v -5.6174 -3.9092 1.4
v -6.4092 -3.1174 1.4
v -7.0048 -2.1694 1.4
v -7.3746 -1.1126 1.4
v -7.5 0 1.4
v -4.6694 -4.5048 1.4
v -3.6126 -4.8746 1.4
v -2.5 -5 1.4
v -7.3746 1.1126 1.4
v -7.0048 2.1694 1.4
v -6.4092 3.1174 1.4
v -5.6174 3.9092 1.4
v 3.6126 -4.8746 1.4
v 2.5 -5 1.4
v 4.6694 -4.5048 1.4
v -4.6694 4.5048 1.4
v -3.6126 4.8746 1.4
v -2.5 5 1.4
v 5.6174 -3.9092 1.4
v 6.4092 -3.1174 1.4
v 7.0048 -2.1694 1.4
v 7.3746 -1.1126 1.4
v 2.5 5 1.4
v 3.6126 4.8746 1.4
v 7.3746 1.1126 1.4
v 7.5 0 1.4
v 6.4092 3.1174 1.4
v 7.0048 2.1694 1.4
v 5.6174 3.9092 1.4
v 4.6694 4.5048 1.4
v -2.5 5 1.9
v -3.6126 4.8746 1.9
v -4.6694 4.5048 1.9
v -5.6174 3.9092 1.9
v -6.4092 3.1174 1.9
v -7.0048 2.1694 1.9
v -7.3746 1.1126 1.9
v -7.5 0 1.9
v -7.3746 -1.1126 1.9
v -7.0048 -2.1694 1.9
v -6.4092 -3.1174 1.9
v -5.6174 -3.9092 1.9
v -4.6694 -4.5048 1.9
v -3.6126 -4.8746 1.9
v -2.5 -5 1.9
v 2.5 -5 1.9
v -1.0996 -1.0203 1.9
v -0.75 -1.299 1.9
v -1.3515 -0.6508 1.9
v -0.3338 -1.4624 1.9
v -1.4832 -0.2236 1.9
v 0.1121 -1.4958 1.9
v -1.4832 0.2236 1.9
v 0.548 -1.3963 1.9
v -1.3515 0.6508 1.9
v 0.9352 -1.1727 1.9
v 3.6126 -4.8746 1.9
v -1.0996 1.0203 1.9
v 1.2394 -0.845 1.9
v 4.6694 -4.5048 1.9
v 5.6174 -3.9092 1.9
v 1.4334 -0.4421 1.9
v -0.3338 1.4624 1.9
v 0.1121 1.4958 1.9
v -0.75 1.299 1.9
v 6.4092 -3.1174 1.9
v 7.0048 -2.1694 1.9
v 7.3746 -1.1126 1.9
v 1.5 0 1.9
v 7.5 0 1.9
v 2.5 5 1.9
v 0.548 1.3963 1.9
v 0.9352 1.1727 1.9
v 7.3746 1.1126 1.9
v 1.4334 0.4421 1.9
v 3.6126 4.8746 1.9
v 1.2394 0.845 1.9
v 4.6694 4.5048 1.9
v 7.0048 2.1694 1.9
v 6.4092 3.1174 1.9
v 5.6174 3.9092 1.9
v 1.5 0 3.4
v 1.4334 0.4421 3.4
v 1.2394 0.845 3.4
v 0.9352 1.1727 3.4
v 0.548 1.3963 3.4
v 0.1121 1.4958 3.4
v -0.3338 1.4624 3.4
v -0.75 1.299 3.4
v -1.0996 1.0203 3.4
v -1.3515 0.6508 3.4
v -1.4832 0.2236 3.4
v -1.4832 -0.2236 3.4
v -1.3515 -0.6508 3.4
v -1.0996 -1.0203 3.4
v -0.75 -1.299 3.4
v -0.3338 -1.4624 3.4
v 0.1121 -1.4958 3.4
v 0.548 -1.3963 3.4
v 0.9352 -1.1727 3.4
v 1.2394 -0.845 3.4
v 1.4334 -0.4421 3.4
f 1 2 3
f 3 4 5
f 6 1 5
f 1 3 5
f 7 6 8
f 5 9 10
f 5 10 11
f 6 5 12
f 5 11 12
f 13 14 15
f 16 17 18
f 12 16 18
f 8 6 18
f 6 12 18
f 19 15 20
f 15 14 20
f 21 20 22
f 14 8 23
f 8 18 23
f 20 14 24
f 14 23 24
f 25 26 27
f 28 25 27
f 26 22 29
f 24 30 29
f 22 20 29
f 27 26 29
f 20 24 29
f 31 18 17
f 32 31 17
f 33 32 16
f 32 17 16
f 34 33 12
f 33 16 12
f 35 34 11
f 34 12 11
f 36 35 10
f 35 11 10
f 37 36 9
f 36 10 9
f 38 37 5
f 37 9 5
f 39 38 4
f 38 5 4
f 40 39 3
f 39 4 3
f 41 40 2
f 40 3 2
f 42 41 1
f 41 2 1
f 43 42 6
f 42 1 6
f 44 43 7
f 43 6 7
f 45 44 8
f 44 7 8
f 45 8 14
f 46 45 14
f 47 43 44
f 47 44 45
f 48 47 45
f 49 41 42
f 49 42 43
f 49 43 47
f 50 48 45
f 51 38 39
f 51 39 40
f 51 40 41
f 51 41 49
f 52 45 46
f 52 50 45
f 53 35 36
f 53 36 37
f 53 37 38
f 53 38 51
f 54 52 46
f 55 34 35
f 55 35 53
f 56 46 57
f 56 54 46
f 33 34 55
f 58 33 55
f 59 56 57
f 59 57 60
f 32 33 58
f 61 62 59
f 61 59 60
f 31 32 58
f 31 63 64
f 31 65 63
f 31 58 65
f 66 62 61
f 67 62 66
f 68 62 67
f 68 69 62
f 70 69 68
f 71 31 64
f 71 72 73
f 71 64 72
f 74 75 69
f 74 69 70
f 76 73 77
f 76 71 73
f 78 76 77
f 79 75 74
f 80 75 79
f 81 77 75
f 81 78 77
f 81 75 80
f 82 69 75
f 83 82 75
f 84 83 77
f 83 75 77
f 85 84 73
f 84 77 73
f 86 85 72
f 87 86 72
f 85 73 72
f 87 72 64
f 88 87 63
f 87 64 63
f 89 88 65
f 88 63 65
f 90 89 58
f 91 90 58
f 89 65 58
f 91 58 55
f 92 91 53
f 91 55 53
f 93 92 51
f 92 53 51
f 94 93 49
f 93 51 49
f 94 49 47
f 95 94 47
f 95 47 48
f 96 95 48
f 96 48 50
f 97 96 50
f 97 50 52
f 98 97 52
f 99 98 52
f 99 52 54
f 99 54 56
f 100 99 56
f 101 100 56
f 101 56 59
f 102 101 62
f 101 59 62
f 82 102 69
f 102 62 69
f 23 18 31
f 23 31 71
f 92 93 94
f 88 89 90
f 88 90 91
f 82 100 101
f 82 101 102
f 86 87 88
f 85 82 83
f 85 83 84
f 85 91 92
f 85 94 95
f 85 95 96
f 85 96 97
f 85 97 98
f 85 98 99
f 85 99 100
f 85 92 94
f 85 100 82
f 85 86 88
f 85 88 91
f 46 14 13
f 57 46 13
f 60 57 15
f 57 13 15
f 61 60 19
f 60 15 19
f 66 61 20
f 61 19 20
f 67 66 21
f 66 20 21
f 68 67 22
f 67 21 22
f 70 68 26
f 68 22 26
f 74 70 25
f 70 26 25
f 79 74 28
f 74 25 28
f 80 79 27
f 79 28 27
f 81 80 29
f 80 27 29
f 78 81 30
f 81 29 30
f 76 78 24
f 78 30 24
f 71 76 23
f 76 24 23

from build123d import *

# Parameters (mm, degrees)
PAD_DEPTH    = 0.5
SKETCH_R     = 1.5
PAD001_DEPTH = 1.5


with BuildPart() as part:
    # Sketch002 → Pad (new body)
    with BuildSketch(Plane.XY.offset(1.4)):
        with BuildLine():
            ThreePointArc((-2.5, 5), (-7.5, 0), (-2.5, -5))
            Line((-2.5, -5), (2.5, -5))
            ThreePointArc((2.5, -5), (7.5, 0), (2.5, 5))
            Line((-2.5, 5), (2.5, 5))
        make_face()
    extrude(amount=PAD_DEPTH)

    # Sketch (on Face6 of Pad) → Pad001 (join)
    with BuildSketch(Plane.XY.offset(1.9)):
        Circle(SKETCH_R)
    extrude(amount=PAD001_DEPTH)


solid = part.part
